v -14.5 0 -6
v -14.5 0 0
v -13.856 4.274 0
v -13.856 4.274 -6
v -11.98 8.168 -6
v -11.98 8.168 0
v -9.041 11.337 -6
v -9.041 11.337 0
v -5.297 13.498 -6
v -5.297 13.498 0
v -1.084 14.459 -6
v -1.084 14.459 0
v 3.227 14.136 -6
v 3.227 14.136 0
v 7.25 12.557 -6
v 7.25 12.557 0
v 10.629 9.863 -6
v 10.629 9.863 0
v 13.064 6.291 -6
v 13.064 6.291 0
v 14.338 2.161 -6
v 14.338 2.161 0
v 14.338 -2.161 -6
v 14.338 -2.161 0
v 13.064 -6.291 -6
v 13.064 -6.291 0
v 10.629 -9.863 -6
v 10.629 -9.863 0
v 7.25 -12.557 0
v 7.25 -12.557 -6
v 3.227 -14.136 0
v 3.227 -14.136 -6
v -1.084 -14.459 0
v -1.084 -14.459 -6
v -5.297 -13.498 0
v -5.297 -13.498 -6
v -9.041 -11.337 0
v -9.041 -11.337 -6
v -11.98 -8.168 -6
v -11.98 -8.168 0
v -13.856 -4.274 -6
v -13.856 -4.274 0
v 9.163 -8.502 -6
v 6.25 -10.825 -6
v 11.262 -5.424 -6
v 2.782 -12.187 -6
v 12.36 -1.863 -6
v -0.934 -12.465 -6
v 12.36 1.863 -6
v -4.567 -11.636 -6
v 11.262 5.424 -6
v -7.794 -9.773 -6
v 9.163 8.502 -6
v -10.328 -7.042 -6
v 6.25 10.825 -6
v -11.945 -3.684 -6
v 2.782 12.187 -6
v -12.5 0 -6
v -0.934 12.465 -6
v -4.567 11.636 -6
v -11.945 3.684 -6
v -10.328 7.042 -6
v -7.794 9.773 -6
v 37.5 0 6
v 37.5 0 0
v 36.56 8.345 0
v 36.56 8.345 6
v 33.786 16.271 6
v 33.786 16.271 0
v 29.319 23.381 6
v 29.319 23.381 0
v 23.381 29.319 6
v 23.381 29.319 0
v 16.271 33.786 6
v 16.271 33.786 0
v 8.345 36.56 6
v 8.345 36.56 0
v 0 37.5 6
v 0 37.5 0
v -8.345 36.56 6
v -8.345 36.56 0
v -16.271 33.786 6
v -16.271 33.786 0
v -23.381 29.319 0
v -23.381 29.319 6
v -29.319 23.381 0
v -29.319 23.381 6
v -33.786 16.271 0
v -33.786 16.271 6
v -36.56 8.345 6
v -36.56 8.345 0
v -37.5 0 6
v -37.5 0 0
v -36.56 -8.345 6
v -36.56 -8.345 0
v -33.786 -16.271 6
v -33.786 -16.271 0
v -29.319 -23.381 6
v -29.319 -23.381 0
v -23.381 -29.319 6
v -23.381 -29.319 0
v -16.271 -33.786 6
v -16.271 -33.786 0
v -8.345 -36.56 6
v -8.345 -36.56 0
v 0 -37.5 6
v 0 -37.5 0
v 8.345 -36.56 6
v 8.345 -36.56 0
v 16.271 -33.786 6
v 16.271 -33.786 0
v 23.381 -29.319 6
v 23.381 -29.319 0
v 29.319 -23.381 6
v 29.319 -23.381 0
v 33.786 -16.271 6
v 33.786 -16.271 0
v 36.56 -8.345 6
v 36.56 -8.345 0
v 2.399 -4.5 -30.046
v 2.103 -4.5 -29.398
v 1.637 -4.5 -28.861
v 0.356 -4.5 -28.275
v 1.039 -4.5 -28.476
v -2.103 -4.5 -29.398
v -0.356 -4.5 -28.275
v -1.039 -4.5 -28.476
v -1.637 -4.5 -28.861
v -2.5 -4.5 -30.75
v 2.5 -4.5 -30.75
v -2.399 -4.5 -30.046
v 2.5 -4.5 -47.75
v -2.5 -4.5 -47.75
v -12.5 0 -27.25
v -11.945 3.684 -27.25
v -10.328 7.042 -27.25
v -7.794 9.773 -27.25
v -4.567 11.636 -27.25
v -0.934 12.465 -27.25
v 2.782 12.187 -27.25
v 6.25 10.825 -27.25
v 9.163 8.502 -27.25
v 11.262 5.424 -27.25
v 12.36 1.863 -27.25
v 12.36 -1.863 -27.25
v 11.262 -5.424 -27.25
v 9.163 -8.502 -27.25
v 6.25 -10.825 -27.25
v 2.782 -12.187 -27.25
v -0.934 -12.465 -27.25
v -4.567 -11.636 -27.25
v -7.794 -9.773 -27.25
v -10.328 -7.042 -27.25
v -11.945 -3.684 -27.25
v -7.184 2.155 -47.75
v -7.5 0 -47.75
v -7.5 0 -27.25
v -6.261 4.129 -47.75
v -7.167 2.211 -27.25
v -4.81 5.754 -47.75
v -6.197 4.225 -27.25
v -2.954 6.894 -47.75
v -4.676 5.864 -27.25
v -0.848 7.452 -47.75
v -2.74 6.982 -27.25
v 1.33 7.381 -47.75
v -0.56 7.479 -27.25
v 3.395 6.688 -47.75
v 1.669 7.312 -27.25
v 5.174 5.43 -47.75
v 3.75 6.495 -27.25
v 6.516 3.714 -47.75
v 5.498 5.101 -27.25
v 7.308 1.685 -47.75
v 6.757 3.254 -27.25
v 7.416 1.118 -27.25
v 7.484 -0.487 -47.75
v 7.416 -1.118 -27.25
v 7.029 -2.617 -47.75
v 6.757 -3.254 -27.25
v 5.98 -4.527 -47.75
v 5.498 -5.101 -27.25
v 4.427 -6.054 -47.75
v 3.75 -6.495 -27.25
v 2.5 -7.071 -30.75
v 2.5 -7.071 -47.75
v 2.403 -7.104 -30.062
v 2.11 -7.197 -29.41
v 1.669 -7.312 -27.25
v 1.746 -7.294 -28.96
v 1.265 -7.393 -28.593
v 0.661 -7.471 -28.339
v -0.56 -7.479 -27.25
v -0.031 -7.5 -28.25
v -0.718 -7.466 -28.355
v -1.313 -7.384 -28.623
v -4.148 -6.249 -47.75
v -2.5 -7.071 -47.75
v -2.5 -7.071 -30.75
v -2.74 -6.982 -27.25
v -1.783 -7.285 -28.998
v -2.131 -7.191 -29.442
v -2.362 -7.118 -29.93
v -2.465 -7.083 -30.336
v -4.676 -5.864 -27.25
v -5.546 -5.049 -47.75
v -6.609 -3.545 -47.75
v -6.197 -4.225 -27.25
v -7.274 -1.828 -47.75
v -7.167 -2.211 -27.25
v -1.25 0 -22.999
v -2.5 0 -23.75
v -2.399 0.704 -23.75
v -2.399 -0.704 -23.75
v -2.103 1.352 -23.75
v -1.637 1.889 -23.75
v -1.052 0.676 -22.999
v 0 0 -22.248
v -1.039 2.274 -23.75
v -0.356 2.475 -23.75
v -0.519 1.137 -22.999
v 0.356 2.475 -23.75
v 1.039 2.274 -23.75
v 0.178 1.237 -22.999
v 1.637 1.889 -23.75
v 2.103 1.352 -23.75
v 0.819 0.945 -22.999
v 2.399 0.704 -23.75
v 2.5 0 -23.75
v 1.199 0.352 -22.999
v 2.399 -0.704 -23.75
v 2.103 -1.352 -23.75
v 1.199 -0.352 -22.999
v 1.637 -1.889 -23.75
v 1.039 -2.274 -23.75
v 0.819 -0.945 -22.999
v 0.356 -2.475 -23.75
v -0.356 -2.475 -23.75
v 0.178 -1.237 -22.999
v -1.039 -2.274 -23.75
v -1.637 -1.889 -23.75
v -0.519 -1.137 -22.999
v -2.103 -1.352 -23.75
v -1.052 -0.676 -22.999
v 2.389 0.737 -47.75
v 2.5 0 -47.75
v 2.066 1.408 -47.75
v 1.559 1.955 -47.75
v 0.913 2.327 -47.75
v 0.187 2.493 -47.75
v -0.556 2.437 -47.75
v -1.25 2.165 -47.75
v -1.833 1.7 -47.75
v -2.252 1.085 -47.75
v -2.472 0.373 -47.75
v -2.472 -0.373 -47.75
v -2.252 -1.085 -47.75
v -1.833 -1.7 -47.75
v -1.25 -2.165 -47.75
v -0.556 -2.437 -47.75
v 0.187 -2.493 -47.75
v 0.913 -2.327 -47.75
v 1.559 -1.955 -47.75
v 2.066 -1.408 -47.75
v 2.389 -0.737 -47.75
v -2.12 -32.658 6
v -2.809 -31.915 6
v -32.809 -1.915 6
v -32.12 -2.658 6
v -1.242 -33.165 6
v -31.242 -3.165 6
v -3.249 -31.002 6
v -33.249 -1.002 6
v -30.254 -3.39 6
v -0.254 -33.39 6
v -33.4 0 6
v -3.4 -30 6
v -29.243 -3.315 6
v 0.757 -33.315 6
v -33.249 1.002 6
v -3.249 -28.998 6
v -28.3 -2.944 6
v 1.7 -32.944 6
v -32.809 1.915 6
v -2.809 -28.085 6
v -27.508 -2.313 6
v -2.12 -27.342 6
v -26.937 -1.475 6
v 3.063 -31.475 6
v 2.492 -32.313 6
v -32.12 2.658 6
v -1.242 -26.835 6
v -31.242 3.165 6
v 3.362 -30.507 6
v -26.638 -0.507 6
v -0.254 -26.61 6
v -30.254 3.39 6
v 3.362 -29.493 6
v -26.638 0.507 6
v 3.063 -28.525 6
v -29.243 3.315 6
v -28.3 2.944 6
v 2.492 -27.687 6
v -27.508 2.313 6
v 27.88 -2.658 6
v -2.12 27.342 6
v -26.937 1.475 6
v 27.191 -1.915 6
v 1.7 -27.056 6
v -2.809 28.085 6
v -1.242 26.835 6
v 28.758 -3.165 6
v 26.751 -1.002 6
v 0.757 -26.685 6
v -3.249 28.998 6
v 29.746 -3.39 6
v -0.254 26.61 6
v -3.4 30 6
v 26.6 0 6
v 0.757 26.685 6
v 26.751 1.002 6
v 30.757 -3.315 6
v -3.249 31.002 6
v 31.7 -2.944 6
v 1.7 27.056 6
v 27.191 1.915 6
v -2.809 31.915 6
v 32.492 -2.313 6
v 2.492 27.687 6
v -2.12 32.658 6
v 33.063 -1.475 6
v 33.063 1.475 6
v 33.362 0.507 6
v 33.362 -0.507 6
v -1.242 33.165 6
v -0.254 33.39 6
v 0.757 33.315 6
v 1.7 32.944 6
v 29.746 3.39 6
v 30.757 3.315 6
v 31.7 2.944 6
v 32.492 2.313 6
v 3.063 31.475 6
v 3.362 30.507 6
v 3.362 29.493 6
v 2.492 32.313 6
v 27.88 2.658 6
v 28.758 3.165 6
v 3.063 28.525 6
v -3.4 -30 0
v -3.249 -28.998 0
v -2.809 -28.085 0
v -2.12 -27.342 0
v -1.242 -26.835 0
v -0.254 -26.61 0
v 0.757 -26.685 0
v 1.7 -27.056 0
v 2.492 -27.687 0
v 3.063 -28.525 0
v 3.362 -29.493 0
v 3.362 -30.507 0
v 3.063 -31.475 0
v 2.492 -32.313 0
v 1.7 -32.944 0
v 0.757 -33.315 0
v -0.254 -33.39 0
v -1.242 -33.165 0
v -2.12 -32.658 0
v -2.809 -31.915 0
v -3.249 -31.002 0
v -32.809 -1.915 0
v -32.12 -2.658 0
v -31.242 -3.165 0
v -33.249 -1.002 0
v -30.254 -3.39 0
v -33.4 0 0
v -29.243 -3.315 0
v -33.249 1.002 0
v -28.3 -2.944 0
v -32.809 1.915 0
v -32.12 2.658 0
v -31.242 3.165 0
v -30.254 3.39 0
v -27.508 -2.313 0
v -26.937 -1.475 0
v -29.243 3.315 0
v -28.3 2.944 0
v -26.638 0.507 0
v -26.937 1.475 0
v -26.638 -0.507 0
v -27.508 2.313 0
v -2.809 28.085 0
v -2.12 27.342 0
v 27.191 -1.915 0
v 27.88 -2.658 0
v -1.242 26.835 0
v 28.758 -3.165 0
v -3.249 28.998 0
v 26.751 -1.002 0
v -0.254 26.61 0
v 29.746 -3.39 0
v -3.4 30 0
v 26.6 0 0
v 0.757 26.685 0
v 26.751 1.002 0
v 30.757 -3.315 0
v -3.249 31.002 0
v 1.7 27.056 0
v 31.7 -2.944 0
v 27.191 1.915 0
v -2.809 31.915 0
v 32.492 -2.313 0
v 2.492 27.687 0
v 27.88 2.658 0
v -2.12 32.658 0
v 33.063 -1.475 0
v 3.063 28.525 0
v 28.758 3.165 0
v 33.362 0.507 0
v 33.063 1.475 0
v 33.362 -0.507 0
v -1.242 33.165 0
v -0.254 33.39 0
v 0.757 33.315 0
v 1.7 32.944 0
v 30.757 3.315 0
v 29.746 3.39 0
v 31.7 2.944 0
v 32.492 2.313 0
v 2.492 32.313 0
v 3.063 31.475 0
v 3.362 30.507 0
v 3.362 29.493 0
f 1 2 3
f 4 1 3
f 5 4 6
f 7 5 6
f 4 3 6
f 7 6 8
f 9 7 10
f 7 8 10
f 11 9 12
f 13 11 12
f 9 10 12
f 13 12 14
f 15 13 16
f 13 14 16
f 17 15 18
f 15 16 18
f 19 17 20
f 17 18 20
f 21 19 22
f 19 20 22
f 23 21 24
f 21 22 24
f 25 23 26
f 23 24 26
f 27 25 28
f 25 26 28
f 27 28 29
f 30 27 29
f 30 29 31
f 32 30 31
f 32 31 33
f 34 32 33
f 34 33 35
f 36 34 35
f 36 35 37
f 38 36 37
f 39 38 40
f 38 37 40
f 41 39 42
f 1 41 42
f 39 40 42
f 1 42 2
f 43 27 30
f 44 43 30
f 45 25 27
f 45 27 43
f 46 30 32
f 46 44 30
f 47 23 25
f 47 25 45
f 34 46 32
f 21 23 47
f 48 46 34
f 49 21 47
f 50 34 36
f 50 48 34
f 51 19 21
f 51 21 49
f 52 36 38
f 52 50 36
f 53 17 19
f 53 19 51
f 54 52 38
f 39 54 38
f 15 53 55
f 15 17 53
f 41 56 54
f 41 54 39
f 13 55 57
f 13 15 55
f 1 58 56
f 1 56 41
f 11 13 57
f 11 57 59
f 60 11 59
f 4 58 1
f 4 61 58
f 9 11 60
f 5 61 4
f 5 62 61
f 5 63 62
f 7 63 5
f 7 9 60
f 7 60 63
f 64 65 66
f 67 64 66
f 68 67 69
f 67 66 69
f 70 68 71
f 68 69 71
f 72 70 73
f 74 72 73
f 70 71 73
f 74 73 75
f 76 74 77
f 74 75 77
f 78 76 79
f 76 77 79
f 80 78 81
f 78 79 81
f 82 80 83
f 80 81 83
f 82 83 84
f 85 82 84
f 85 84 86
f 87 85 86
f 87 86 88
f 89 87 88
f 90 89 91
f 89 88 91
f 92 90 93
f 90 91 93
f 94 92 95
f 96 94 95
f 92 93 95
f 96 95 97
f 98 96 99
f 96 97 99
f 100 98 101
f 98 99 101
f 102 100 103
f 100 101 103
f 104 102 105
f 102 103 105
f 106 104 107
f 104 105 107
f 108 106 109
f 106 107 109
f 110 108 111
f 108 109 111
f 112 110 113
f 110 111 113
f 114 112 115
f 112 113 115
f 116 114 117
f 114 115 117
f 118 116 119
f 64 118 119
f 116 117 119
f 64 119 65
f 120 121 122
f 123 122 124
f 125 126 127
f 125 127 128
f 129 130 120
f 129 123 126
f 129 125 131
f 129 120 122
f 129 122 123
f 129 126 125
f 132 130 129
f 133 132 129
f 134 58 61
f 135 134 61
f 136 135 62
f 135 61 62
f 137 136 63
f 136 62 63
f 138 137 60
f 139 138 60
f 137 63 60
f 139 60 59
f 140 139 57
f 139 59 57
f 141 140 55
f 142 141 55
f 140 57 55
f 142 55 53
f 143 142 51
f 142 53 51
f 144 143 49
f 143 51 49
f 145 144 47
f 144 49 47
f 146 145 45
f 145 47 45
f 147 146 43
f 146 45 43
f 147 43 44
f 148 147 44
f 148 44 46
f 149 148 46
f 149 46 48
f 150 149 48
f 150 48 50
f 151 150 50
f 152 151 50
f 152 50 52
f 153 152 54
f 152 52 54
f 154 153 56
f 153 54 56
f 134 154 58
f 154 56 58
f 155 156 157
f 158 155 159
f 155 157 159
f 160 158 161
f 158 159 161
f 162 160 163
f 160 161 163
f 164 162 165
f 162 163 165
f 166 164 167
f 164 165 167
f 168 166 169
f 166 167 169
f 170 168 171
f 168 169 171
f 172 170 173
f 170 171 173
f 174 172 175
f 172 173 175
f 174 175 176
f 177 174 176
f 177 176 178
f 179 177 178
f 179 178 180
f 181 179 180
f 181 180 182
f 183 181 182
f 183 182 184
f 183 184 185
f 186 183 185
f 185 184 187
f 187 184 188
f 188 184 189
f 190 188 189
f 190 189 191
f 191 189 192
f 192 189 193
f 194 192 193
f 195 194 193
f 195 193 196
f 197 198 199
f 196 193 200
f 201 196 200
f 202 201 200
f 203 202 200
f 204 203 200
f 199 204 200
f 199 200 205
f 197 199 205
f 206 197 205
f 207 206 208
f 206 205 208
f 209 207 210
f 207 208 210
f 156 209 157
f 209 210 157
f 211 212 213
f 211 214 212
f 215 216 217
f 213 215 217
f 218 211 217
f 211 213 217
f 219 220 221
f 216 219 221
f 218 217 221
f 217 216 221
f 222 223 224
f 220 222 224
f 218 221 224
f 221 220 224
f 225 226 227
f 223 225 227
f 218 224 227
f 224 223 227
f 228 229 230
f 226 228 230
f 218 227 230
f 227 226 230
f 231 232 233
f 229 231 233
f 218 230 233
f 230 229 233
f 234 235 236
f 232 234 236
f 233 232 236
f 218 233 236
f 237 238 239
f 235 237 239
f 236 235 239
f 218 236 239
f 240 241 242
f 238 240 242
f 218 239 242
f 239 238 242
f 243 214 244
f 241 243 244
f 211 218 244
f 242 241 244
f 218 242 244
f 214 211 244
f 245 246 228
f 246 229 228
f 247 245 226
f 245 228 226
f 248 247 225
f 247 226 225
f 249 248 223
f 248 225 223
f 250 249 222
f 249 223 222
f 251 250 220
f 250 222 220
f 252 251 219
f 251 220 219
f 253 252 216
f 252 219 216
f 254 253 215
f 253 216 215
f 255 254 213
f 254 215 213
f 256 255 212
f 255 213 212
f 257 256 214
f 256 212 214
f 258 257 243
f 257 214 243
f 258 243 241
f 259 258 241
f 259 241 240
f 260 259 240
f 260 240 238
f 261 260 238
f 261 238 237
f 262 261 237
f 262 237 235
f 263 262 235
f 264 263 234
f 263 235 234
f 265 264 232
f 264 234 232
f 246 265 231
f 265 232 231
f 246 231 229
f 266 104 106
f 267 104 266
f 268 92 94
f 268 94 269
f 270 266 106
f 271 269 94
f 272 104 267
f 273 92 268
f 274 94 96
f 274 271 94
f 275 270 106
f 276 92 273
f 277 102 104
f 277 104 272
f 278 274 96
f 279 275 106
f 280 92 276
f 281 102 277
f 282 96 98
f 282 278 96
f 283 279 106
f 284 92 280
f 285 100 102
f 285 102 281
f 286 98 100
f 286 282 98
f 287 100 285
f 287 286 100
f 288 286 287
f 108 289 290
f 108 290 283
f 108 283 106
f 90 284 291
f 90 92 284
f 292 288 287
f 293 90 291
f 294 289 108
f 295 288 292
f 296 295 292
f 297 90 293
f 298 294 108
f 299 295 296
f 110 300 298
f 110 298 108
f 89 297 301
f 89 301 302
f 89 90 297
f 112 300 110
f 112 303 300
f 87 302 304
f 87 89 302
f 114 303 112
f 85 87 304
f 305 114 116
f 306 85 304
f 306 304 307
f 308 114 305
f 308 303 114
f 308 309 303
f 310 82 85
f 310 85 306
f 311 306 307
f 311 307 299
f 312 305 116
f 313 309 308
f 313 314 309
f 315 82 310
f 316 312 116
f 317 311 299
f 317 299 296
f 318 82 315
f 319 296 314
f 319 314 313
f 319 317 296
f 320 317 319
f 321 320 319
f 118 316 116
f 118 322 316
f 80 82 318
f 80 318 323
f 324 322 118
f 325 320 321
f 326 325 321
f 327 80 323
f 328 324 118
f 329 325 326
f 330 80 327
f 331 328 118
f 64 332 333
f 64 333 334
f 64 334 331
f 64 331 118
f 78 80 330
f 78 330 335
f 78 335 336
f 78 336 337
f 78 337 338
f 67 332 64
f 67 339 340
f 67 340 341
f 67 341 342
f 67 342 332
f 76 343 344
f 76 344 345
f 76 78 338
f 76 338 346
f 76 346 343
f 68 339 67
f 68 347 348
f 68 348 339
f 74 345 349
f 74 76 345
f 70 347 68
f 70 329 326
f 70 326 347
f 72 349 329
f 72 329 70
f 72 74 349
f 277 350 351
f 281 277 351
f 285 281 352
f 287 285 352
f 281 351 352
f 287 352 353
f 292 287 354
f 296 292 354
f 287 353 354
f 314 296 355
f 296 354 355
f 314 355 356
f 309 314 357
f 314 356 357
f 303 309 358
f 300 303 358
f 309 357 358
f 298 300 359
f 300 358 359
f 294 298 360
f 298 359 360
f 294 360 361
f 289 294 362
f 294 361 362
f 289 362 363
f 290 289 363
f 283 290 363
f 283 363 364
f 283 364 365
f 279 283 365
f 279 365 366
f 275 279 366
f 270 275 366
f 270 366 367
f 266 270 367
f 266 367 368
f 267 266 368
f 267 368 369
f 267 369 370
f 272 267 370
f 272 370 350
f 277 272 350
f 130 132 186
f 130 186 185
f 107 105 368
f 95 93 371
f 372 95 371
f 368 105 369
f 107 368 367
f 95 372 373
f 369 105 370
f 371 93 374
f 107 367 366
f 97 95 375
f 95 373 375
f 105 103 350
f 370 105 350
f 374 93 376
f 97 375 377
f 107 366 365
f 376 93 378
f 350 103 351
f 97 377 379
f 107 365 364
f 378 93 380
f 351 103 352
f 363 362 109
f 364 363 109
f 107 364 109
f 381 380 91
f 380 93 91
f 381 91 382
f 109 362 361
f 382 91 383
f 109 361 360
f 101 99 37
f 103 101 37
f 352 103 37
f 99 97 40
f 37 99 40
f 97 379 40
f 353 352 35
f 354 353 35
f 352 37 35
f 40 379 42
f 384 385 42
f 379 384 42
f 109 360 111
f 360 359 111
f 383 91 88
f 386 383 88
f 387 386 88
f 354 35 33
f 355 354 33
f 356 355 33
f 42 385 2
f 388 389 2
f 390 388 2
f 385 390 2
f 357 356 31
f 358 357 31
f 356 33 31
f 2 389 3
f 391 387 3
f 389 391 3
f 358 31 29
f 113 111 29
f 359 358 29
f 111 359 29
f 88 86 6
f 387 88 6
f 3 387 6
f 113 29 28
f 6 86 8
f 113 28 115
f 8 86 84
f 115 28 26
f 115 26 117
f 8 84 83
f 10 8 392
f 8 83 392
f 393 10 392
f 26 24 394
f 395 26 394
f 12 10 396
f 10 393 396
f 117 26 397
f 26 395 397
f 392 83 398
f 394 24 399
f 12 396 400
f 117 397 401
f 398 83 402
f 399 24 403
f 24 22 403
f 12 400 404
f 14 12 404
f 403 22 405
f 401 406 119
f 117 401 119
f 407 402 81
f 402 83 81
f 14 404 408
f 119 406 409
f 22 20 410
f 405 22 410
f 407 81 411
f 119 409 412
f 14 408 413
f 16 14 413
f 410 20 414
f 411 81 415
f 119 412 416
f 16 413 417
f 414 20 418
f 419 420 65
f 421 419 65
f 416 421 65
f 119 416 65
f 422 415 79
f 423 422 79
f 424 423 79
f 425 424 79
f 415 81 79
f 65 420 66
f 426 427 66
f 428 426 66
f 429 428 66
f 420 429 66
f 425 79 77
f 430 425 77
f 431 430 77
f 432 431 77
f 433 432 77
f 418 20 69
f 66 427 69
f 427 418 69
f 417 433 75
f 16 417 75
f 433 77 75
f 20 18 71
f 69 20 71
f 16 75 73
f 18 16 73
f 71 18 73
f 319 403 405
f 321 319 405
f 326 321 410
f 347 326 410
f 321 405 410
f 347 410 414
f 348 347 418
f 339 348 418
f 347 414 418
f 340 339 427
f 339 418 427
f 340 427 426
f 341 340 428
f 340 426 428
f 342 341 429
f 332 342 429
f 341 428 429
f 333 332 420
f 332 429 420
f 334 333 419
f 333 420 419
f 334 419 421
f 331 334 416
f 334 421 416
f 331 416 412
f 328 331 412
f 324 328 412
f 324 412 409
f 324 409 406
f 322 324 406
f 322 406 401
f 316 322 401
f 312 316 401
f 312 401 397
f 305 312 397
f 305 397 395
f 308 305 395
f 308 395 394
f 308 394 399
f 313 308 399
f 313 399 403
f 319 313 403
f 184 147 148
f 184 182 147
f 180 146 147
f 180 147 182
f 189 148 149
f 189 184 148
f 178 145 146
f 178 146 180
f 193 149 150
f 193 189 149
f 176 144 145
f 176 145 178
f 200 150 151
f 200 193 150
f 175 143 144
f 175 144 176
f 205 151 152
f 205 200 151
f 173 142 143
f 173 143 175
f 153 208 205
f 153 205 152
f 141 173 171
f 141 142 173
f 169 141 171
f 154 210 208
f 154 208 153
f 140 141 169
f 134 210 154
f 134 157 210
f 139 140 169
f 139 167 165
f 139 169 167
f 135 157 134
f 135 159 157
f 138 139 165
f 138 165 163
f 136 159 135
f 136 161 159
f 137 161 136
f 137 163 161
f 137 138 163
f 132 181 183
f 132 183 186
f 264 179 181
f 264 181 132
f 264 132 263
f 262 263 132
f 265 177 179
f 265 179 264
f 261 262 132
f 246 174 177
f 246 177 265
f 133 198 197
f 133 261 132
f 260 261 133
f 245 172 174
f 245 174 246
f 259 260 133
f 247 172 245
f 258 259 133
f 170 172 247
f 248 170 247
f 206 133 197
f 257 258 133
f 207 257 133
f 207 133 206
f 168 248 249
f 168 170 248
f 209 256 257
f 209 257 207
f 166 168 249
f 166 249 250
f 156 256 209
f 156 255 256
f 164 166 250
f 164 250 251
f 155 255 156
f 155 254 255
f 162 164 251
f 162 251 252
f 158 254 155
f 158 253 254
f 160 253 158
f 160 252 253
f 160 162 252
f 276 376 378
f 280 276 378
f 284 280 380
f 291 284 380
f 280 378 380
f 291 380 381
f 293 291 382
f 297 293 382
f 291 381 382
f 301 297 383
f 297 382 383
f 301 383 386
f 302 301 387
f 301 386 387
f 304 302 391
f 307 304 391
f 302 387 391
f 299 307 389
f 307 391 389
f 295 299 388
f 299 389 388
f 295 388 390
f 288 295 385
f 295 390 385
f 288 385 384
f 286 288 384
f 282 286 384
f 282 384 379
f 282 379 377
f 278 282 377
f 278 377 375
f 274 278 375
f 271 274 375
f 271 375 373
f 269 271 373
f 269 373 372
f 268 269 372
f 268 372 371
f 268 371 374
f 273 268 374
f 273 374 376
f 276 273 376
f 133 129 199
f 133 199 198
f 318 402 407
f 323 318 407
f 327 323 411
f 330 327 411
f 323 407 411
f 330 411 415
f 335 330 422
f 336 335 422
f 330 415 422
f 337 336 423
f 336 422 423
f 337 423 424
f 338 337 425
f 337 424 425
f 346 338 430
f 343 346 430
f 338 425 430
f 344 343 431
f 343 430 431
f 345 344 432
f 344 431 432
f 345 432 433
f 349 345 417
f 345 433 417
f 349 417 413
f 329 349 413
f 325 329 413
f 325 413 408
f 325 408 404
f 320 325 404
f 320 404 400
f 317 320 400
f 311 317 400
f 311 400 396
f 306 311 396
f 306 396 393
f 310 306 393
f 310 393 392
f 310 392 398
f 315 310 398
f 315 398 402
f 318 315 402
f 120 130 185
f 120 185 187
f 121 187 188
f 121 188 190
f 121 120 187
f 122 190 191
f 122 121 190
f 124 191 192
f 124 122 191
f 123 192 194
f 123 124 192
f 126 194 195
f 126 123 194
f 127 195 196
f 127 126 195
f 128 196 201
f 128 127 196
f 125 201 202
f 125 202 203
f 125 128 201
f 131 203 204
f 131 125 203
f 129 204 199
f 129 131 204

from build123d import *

# Parameters (mm, degrees)
SKETCH1_R                                     = 37.5
BOSS_EXTRUDE1_DEPTH                           = 6
TROU_POUR_TARAUDAGE_POUR_TROU_TARAUD_M8_D     = 6.8
TROU_POUR_TARAUDAGE_POUR_TROU_TARAUD_M8_DEPTH = 23
TROU_POUR_TARAUDAGE_POUR_TROU_TARAUD_M8_TIP   = 2.042926105
SKETCH6_R                                     = 14.5
BOSS_EXTRU_1_DEPTH                            = 6
SKETCH5_R                                     = 12.5
BOSS_EXTRU_2_DEPTH                            = 21.25
ESQUISSE11_R                                  = 7.5
BOSS_EXTRU_6_DEPTH                            = 20.5
TROU_POUR_TARAUDAGE_POUR_TROU_TARAUD_M6_D     = 5
TROU_POUR_TARAUDAGE_POUR_TROU_TARAUD_M6_DEPTH = 24
TROU_POUR_TARAUDAGE_POUR_TROU_TARAUD_M6_TIP   = 1.502151548
ENL_V_MAT_EXTRU_1_DEPTH                       = 34


with BuildPart() as part:
    # Sketch1 → Boss-Extrude1 (new body)
    with BuildSketch(Plane.XY):
        Circle(SKETCH1_R)
    extrude(amount=BOSS_EXTRUDE1_DEPTH)

    # Trou pour taraudage pour trou taraudé M81
    with Locations(Plane.XY.offset(6)):
        with Locations((-30, 0), (0, 30), (30, 0), (0, -30)):
            Hole(TROU_POUR_TARAUDAGE_POUR_TROU_TARAUD_M8_D / 2, depth=TROU_POUR_TARAUDAGE_POUR_TROU_TARAUD_M8_DEPTH)
            with Locations((0, 0, -(TROU_POUR_TARAUDAGE_POUR_TROU_TARAUD_M8_DEPTH + TROU_POUR_TARAUDAGE_POUR_TROU_TARAUD_M8_TIP / 2))):  # 118° drill point
                Cone(0, TROU_POUR_TARAUDAGE_POUR_TROU_TARAUD_M8_D / 2, TROU_POUR_TARAUDAGE_POUR_TROU_TARAUD_M8_TIP, mode=Mode.SUBTRACT)

    # Sketch6 → Boss.-Extru.1 (add)
    with BuildSketch(Plane(origin=(0, 0, 0), x_dir=(-1, 0, 0), z_dir=(0, 0, -1))):
        Circle(SKETCH6_R)
    extrude(amount=BOSS_EXTRU_1_DEPTH)

    # Sketch5 → Boss.-Extru.2 (add)
    with BuildSketch(Plane(origin=(0, 0, -6), x_dir=(-1, 0, 0), z_dir=(0, 0, -1))):
        Circle(SKETCH5_R)
    extrude(amount=BOSS_EXTRU_2_DEPTH)

    # Esquisse11 → Boss.-Extru.6 (add)
    with BuildSketch(Plane(origin=(0, 0, -27.25), x_dir=(-1, 0, 0), z_dir=(0, 0, -1))):
        Circle(ESQUISSE11_R)
    extrude(amount=BOSS_EXTRU_6_DEPTH)

    # Trou pour taraudage pour trou taraudé M61
    with Locations(Plane(origin=(0, 0, -47.75), x_dir=(-1, 0, 0), z_dir=(0, 0, -1))):
        with Locations((0, 0)):
            Hole(TROU_POUR_TARAUDAGE_POUR_TROU_TARAUD_M6_D / 2, depth=TROU_POUR_TARAUDAGE_POUR_TROU_TARAUD_M6_DEPTH)
            with Locations((0, 0, -(TROU_POUR_TARAUDAGE_POUR_TROU_TARAUD_M6_DEPTH + TROU_POUR_TARAUDAGE_POUR_TROU_TARAUD_M6_TIP / 2))):  # 118° drill point
                Cone(0, TROU_POUR_TARAUDAGE_POUR_TROU_TARAUD_M6_D / 2, TROU_POUR_TARAUDAGE_POUR_TROU_TARAUD_M6_TIP, mode=Mode.SUBTRACT)

    # Esquisse5 → Enlèv. mat.-Extru.1 (cut, through all)
    with BuildSketch(Plane(origin=(0, -4.5, 0), x_dir=(1, 0, 0), z_dir=(0, 1, 0))):
        with BuildLine():
            Line((2.5, 47.75), (2.5, 30.75))
            ThreePointArc((2.5, 30.75), (0, 28.25), (-2.5, 30.75))
            Line((-2.5, 30.75), (-2.5, 47.75))
            ThreePointArc((-2.5, 47.75), (0, 50.25), (2.5, 47.75))
        make_face()
    extrude(amount=-ENL_V_MAT_EXTRU_1_DEPTH, mode=Mode.SUBTRACT)


solid = part.part
